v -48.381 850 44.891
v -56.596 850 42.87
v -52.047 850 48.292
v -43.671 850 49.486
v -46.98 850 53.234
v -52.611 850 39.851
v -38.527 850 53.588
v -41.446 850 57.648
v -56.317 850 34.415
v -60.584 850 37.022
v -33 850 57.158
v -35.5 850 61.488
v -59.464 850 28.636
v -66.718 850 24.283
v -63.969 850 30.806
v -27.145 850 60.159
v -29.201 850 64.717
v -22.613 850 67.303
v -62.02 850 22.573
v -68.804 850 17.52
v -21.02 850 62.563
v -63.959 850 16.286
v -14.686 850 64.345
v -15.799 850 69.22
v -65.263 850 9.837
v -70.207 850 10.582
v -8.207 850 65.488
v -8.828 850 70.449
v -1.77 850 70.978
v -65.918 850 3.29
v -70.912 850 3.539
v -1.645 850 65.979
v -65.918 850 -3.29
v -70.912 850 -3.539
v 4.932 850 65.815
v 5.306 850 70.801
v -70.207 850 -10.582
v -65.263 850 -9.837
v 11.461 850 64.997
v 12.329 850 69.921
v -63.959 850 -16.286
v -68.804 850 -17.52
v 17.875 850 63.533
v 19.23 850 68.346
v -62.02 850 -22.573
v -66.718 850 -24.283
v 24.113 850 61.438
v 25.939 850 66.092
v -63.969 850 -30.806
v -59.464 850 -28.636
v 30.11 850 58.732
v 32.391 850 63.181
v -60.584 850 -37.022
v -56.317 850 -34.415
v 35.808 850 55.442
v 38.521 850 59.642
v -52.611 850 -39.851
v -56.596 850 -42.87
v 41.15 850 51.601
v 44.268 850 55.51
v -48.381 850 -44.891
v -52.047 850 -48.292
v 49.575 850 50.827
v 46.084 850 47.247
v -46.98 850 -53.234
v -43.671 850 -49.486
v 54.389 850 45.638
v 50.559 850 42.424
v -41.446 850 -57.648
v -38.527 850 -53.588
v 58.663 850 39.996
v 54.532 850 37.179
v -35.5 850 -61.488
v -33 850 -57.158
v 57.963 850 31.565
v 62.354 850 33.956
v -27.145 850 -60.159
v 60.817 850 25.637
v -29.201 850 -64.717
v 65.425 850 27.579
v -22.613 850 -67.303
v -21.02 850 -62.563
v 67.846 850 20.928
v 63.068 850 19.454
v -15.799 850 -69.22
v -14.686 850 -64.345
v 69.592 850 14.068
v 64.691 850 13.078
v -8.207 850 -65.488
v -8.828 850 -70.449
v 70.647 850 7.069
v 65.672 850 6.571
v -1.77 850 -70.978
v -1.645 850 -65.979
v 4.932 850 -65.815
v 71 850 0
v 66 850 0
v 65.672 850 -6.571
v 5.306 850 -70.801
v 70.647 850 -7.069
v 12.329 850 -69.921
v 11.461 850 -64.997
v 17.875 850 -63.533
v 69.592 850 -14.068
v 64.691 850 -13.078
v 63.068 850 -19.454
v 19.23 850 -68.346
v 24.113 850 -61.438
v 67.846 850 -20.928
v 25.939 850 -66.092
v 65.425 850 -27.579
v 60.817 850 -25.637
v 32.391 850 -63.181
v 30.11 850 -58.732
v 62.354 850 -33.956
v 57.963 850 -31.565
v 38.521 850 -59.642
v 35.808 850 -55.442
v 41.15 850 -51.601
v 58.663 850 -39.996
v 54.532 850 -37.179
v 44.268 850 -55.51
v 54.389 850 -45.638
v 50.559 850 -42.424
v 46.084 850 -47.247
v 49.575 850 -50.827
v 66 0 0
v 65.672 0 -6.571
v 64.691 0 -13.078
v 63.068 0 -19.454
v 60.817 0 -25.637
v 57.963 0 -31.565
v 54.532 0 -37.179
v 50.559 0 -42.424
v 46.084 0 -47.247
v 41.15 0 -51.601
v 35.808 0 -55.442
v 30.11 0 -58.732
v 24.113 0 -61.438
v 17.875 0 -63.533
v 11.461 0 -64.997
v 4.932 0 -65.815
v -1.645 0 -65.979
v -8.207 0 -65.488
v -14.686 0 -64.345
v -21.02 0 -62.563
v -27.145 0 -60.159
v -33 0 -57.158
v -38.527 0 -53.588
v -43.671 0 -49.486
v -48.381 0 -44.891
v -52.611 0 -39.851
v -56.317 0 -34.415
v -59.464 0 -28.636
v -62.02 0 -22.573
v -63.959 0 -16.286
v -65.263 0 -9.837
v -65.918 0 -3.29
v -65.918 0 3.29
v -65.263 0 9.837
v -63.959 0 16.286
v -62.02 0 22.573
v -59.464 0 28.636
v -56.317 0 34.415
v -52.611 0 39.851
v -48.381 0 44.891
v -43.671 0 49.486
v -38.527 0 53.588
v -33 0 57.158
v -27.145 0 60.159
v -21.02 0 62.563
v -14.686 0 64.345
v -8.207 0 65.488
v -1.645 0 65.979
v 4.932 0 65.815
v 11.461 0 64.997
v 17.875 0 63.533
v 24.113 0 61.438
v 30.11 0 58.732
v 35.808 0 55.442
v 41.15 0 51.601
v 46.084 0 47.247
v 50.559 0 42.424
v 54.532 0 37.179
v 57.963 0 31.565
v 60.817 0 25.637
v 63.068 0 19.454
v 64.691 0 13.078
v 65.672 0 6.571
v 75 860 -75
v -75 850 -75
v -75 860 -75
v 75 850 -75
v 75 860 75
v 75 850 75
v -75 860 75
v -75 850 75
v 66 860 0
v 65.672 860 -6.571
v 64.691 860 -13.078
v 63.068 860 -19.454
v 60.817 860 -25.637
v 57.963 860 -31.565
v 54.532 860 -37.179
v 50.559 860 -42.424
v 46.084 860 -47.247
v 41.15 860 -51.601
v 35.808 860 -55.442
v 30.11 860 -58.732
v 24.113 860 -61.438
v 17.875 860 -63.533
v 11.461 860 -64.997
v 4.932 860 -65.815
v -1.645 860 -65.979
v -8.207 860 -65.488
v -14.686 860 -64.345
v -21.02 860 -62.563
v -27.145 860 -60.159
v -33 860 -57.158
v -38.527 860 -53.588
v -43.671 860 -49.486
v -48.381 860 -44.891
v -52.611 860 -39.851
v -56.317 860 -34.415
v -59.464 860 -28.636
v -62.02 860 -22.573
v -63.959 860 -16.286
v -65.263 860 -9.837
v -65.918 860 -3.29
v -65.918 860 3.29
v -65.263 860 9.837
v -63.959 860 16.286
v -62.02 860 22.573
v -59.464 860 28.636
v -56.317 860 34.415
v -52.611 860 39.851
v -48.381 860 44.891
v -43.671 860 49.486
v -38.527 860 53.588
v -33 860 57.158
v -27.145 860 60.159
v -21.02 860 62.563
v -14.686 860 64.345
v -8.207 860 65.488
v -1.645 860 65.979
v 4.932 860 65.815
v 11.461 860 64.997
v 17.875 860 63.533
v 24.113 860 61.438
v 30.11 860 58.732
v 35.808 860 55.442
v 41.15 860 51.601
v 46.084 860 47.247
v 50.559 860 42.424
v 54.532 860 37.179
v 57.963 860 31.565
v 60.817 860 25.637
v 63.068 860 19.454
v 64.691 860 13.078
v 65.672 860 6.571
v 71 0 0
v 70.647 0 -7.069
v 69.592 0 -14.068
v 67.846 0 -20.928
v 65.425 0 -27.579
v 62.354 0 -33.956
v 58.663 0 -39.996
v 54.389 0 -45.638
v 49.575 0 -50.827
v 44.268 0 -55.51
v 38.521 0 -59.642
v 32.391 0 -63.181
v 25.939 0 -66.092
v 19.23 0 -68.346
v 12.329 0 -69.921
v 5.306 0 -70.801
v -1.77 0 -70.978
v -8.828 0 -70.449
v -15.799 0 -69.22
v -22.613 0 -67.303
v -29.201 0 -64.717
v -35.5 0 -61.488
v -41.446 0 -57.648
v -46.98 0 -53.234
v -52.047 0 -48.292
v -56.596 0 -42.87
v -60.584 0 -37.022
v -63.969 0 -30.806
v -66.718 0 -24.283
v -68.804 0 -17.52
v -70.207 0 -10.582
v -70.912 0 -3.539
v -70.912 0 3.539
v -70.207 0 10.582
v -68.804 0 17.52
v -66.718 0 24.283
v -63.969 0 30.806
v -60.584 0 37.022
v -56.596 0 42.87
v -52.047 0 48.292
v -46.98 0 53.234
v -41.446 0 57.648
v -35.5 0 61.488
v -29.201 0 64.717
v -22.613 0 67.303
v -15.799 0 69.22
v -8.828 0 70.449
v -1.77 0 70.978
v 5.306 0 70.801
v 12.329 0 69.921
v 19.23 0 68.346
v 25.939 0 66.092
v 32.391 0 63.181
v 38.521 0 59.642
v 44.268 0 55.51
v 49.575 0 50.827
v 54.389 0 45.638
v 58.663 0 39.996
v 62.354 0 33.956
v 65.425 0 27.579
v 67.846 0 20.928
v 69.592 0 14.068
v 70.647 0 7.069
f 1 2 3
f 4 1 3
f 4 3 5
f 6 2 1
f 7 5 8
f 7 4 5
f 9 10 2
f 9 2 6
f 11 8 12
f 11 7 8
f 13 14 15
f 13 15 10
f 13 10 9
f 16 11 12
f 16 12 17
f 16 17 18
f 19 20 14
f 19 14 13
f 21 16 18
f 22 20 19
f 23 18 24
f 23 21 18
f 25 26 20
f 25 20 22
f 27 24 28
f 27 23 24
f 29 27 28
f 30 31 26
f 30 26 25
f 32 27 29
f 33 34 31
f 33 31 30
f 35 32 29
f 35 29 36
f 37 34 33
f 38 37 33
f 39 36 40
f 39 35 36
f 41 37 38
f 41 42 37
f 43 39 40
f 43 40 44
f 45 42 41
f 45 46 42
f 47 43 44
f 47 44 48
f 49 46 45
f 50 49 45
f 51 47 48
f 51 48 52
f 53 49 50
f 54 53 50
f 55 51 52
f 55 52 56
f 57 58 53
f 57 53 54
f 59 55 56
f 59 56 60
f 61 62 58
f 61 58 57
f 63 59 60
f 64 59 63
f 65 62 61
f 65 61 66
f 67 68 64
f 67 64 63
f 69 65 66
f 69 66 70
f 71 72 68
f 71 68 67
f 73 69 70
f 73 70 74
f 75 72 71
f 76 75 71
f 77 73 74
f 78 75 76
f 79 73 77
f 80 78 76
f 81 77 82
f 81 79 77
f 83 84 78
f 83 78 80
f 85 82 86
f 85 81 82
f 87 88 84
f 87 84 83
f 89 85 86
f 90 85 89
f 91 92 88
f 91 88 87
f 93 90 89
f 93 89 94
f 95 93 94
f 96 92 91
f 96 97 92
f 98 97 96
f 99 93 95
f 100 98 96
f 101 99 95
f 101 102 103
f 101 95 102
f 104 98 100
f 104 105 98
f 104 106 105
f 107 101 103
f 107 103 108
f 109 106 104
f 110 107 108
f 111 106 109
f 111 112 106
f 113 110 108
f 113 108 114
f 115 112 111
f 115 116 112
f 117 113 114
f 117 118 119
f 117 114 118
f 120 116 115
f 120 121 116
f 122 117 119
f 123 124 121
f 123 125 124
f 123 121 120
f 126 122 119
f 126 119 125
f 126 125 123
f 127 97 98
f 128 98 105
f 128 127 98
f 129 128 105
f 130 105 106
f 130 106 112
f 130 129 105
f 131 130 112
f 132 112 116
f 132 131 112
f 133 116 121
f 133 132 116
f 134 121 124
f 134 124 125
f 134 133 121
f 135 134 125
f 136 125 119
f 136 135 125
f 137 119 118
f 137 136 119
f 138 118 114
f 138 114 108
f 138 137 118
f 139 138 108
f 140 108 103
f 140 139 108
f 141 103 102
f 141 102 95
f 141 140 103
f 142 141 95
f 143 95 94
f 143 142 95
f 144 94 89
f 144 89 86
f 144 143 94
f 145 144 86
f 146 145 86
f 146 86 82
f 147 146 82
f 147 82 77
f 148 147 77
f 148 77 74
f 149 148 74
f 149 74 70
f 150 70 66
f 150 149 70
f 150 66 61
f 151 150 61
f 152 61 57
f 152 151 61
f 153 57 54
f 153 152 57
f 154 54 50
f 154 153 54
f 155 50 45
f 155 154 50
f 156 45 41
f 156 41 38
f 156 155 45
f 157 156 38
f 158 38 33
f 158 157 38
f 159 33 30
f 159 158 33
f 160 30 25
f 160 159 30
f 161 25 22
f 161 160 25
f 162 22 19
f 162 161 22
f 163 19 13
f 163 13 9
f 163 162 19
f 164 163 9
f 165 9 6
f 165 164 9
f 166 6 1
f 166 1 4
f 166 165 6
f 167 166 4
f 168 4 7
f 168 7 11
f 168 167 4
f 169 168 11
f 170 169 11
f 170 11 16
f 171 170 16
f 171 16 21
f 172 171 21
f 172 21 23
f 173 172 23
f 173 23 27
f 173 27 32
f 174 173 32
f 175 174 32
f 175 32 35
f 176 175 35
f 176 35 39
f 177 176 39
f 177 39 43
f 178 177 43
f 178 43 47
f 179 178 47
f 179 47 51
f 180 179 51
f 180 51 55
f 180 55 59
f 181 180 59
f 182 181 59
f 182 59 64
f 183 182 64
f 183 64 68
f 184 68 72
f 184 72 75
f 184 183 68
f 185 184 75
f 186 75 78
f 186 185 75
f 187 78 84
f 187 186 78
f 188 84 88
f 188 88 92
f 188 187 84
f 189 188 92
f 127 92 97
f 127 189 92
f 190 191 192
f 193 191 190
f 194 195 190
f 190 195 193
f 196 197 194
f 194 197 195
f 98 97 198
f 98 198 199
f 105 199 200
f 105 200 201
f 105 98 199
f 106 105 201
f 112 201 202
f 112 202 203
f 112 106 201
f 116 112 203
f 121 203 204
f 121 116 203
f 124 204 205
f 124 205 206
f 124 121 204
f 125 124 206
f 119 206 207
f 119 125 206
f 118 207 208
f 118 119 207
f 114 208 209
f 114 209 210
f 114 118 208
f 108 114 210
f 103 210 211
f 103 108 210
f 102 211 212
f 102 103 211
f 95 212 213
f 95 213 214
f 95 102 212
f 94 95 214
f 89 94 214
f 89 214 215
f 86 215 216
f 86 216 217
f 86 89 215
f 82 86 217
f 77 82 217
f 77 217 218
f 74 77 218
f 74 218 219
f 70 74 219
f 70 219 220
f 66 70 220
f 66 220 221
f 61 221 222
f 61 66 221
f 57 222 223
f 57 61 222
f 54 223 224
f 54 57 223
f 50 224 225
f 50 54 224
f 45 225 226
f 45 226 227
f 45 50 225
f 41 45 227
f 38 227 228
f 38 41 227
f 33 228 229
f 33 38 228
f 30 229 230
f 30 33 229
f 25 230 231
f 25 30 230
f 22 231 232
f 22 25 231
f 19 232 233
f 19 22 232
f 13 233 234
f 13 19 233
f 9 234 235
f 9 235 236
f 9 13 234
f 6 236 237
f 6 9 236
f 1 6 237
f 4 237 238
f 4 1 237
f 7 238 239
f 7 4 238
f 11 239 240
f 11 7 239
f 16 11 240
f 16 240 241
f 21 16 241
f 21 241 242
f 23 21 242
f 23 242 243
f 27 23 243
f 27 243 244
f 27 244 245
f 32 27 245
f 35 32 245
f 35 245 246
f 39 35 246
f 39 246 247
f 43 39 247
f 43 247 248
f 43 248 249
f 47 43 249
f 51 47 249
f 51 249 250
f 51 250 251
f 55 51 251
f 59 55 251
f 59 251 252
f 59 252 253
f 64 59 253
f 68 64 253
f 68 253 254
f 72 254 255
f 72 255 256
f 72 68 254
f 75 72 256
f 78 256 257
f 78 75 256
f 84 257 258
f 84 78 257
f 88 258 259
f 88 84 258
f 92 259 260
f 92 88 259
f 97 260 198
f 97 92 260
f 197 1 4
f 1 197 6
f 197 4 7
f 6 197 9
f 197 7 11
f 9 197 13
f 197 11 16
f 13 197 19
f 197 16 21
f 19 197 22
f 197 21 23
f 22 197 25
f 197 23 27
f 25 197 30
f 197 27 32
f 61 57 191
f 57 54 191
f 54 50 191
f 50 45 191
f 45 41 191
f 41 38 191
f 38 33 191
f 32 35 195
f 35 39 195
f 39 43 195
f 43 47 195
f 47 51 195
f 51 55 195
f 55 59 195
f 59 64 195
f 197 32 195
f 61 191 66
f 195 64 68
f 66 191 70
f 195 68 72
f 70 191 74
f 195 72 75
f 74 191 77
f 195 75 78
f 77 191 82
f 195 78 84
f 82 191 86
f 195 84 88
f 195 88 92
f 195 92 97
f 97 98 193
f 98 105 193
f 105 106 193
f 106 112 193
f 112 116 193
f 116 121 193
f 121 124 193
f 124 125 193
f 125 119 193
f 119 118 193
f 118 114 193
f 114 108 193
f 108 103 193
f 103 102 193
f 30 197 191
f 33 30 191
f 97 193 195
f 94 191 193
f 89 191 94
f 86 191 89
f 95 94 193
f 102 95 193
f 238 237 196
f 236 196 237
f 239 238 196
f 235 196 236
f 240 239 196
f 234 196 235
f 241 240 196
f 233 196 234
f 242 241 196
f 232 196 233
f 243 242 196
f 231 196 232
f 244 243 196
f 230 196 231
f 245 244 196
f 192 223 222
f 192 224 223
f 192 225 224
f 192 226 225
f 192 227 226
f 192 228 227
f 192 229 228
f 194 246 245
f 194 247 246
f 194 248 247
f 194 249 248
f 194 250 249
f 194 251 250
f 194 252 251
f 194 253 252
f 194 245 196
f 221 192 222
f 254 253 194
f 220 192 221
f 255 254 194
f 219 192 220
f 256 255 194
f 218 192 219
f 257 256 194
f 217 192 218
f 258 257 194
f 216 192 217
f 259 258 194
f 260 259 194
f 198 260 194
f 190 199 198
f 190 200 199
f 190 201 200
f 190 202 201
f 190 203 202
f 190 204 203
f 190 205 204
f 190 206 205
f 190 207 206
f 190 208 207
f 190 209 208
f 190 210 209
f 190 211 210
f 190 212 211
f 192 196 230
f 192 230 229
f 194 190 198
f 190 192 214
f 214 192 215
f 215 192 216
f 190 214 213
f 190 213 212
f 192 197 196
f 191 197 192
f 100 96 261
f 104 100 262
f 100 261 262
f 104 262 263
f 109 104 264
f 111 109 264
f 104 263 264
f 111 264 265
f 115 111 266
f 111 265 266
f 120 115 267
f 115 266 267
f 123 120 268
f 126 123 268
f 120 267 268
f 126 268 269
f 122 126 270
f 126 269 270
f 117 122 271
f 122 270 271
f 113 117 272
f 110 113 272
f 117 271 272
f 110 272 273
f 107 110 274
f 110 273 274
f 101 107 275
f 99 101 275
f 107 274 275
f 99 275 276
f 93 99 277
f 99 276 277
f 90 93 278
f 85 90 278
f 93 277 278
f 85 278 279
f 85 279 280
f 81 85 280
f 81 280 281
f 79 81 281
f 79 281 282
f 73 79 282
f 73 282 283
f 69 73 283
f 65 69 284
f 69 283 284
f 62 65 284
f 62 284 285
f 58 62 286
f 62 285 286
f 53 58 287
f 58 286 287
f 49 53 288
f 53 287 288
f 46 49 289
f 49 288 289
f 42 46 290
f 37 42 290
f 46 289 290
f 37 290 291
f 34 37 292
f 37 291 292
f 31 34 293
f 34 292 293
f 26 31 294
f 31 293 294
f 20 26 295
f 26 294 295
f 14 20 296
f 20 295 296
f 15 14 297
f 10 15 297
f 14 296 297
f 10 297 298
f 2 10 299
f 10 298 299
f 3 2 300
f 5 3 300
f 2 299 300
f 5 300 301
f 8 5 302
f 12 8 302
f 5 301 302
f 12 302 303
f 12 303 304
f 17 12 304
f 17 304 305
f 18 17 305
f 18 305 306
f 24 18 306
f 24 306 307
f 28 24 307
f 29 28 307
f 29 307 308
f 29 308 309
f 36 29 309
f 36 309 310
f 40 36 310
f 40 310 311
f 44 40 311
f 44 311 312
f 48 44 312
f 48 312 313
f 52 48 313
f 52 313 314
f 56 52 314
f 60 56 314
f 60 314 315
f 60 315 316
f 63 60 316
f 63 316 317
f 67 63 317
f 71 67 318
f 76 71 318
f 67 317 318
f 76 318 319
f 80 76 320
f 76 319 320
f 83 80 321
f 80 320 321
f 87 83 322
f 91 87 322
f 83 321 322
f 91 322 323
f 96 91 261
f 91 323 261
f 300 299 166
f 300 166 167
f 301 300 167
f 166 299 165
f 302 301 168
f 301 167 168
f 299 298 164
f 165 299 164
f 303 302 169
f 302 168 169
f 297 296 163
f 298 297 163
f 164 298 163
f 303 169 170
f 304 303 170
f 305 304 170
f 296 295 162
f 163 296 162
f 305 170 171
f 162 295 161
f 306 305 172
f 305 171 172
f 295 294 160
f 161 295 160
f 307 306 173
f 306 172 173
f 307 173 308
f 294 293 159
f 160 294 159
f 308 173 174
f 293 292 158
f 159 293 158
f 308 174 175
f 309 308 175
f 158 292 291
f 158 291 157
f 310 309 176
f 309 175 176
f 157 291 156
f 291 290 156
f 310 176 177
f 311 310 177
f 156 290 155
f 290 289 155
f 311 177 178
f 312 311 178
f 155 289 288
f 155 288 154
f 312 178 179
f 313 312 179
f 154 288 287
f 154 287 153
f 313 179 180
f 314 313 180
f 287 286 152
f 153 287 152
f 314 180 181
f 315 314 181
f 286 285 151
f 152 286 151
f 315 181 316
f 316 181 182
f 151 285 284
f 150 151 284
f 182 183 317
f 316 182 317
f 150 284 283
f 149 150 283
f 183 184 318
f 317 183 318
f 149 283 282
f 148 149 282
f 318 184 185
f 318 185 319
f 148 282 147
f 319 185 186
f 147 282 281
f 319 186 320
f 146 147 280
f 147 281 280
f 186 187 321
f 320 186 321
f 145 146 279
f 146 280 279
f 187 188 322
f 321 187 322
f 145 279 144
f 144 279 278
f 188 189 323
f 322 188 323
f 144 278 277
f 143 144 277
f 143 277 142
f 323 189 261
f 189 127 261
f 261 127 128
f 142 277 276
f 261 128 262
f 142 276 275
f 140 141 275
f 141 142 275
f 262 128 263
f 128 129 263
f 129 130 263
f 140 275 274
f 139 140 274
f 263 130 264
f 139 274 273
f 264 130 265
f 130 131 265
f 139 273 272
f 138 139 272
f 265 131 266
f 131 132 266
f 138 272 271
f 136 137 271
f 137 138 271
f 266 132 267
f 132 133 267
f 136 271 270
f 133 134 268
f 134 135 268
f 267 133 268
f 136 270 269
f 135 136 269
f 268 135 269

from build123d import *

# Parameters (mm, degrees)
SKETCH1_R           = 71
SKETCH1_R_2         = 66
BOSS_EXTRUDE1_DEPTH = 850
SKETCH2_W           = 150
SKETCH2_H           = 150
SKETCH2_R           = 66
BOSS_EXTRUDE2_DEPTH = 10


with BuildPart() as part:
    # Sketch1 → Boss-Extrude1 (new body)
    with BuildSketch(Plane(origin=(0, 0, 0), x_dir=(1, 0, 0), z_dir=(0, 1, 0))):
        Circle(SKETCH1_R)
        Circle(SKETCH1_R_2, mode=Mode.SUBTRACT)
    extrude(amount=BOSS_EXTRUDE1_DEPTH)


with BuildPart() as body_2:
    # Sketch2 → Boss-Extrude2 (new body)
    with BuildSketch(Plane(origin=(0, 850, 0), x_dir=(1, 0, 0), z_dir=(0, 1, 0))):
        Rectangle(SKETCH2_W, SKETCH2_H)
        Circle(SKETCH2_R, mode=Mode.SUBTRACT)
    extrude(amount=BOSS_EXTRUDE2_DEPTH)


solid = Compound([part.part, body_2.part])
